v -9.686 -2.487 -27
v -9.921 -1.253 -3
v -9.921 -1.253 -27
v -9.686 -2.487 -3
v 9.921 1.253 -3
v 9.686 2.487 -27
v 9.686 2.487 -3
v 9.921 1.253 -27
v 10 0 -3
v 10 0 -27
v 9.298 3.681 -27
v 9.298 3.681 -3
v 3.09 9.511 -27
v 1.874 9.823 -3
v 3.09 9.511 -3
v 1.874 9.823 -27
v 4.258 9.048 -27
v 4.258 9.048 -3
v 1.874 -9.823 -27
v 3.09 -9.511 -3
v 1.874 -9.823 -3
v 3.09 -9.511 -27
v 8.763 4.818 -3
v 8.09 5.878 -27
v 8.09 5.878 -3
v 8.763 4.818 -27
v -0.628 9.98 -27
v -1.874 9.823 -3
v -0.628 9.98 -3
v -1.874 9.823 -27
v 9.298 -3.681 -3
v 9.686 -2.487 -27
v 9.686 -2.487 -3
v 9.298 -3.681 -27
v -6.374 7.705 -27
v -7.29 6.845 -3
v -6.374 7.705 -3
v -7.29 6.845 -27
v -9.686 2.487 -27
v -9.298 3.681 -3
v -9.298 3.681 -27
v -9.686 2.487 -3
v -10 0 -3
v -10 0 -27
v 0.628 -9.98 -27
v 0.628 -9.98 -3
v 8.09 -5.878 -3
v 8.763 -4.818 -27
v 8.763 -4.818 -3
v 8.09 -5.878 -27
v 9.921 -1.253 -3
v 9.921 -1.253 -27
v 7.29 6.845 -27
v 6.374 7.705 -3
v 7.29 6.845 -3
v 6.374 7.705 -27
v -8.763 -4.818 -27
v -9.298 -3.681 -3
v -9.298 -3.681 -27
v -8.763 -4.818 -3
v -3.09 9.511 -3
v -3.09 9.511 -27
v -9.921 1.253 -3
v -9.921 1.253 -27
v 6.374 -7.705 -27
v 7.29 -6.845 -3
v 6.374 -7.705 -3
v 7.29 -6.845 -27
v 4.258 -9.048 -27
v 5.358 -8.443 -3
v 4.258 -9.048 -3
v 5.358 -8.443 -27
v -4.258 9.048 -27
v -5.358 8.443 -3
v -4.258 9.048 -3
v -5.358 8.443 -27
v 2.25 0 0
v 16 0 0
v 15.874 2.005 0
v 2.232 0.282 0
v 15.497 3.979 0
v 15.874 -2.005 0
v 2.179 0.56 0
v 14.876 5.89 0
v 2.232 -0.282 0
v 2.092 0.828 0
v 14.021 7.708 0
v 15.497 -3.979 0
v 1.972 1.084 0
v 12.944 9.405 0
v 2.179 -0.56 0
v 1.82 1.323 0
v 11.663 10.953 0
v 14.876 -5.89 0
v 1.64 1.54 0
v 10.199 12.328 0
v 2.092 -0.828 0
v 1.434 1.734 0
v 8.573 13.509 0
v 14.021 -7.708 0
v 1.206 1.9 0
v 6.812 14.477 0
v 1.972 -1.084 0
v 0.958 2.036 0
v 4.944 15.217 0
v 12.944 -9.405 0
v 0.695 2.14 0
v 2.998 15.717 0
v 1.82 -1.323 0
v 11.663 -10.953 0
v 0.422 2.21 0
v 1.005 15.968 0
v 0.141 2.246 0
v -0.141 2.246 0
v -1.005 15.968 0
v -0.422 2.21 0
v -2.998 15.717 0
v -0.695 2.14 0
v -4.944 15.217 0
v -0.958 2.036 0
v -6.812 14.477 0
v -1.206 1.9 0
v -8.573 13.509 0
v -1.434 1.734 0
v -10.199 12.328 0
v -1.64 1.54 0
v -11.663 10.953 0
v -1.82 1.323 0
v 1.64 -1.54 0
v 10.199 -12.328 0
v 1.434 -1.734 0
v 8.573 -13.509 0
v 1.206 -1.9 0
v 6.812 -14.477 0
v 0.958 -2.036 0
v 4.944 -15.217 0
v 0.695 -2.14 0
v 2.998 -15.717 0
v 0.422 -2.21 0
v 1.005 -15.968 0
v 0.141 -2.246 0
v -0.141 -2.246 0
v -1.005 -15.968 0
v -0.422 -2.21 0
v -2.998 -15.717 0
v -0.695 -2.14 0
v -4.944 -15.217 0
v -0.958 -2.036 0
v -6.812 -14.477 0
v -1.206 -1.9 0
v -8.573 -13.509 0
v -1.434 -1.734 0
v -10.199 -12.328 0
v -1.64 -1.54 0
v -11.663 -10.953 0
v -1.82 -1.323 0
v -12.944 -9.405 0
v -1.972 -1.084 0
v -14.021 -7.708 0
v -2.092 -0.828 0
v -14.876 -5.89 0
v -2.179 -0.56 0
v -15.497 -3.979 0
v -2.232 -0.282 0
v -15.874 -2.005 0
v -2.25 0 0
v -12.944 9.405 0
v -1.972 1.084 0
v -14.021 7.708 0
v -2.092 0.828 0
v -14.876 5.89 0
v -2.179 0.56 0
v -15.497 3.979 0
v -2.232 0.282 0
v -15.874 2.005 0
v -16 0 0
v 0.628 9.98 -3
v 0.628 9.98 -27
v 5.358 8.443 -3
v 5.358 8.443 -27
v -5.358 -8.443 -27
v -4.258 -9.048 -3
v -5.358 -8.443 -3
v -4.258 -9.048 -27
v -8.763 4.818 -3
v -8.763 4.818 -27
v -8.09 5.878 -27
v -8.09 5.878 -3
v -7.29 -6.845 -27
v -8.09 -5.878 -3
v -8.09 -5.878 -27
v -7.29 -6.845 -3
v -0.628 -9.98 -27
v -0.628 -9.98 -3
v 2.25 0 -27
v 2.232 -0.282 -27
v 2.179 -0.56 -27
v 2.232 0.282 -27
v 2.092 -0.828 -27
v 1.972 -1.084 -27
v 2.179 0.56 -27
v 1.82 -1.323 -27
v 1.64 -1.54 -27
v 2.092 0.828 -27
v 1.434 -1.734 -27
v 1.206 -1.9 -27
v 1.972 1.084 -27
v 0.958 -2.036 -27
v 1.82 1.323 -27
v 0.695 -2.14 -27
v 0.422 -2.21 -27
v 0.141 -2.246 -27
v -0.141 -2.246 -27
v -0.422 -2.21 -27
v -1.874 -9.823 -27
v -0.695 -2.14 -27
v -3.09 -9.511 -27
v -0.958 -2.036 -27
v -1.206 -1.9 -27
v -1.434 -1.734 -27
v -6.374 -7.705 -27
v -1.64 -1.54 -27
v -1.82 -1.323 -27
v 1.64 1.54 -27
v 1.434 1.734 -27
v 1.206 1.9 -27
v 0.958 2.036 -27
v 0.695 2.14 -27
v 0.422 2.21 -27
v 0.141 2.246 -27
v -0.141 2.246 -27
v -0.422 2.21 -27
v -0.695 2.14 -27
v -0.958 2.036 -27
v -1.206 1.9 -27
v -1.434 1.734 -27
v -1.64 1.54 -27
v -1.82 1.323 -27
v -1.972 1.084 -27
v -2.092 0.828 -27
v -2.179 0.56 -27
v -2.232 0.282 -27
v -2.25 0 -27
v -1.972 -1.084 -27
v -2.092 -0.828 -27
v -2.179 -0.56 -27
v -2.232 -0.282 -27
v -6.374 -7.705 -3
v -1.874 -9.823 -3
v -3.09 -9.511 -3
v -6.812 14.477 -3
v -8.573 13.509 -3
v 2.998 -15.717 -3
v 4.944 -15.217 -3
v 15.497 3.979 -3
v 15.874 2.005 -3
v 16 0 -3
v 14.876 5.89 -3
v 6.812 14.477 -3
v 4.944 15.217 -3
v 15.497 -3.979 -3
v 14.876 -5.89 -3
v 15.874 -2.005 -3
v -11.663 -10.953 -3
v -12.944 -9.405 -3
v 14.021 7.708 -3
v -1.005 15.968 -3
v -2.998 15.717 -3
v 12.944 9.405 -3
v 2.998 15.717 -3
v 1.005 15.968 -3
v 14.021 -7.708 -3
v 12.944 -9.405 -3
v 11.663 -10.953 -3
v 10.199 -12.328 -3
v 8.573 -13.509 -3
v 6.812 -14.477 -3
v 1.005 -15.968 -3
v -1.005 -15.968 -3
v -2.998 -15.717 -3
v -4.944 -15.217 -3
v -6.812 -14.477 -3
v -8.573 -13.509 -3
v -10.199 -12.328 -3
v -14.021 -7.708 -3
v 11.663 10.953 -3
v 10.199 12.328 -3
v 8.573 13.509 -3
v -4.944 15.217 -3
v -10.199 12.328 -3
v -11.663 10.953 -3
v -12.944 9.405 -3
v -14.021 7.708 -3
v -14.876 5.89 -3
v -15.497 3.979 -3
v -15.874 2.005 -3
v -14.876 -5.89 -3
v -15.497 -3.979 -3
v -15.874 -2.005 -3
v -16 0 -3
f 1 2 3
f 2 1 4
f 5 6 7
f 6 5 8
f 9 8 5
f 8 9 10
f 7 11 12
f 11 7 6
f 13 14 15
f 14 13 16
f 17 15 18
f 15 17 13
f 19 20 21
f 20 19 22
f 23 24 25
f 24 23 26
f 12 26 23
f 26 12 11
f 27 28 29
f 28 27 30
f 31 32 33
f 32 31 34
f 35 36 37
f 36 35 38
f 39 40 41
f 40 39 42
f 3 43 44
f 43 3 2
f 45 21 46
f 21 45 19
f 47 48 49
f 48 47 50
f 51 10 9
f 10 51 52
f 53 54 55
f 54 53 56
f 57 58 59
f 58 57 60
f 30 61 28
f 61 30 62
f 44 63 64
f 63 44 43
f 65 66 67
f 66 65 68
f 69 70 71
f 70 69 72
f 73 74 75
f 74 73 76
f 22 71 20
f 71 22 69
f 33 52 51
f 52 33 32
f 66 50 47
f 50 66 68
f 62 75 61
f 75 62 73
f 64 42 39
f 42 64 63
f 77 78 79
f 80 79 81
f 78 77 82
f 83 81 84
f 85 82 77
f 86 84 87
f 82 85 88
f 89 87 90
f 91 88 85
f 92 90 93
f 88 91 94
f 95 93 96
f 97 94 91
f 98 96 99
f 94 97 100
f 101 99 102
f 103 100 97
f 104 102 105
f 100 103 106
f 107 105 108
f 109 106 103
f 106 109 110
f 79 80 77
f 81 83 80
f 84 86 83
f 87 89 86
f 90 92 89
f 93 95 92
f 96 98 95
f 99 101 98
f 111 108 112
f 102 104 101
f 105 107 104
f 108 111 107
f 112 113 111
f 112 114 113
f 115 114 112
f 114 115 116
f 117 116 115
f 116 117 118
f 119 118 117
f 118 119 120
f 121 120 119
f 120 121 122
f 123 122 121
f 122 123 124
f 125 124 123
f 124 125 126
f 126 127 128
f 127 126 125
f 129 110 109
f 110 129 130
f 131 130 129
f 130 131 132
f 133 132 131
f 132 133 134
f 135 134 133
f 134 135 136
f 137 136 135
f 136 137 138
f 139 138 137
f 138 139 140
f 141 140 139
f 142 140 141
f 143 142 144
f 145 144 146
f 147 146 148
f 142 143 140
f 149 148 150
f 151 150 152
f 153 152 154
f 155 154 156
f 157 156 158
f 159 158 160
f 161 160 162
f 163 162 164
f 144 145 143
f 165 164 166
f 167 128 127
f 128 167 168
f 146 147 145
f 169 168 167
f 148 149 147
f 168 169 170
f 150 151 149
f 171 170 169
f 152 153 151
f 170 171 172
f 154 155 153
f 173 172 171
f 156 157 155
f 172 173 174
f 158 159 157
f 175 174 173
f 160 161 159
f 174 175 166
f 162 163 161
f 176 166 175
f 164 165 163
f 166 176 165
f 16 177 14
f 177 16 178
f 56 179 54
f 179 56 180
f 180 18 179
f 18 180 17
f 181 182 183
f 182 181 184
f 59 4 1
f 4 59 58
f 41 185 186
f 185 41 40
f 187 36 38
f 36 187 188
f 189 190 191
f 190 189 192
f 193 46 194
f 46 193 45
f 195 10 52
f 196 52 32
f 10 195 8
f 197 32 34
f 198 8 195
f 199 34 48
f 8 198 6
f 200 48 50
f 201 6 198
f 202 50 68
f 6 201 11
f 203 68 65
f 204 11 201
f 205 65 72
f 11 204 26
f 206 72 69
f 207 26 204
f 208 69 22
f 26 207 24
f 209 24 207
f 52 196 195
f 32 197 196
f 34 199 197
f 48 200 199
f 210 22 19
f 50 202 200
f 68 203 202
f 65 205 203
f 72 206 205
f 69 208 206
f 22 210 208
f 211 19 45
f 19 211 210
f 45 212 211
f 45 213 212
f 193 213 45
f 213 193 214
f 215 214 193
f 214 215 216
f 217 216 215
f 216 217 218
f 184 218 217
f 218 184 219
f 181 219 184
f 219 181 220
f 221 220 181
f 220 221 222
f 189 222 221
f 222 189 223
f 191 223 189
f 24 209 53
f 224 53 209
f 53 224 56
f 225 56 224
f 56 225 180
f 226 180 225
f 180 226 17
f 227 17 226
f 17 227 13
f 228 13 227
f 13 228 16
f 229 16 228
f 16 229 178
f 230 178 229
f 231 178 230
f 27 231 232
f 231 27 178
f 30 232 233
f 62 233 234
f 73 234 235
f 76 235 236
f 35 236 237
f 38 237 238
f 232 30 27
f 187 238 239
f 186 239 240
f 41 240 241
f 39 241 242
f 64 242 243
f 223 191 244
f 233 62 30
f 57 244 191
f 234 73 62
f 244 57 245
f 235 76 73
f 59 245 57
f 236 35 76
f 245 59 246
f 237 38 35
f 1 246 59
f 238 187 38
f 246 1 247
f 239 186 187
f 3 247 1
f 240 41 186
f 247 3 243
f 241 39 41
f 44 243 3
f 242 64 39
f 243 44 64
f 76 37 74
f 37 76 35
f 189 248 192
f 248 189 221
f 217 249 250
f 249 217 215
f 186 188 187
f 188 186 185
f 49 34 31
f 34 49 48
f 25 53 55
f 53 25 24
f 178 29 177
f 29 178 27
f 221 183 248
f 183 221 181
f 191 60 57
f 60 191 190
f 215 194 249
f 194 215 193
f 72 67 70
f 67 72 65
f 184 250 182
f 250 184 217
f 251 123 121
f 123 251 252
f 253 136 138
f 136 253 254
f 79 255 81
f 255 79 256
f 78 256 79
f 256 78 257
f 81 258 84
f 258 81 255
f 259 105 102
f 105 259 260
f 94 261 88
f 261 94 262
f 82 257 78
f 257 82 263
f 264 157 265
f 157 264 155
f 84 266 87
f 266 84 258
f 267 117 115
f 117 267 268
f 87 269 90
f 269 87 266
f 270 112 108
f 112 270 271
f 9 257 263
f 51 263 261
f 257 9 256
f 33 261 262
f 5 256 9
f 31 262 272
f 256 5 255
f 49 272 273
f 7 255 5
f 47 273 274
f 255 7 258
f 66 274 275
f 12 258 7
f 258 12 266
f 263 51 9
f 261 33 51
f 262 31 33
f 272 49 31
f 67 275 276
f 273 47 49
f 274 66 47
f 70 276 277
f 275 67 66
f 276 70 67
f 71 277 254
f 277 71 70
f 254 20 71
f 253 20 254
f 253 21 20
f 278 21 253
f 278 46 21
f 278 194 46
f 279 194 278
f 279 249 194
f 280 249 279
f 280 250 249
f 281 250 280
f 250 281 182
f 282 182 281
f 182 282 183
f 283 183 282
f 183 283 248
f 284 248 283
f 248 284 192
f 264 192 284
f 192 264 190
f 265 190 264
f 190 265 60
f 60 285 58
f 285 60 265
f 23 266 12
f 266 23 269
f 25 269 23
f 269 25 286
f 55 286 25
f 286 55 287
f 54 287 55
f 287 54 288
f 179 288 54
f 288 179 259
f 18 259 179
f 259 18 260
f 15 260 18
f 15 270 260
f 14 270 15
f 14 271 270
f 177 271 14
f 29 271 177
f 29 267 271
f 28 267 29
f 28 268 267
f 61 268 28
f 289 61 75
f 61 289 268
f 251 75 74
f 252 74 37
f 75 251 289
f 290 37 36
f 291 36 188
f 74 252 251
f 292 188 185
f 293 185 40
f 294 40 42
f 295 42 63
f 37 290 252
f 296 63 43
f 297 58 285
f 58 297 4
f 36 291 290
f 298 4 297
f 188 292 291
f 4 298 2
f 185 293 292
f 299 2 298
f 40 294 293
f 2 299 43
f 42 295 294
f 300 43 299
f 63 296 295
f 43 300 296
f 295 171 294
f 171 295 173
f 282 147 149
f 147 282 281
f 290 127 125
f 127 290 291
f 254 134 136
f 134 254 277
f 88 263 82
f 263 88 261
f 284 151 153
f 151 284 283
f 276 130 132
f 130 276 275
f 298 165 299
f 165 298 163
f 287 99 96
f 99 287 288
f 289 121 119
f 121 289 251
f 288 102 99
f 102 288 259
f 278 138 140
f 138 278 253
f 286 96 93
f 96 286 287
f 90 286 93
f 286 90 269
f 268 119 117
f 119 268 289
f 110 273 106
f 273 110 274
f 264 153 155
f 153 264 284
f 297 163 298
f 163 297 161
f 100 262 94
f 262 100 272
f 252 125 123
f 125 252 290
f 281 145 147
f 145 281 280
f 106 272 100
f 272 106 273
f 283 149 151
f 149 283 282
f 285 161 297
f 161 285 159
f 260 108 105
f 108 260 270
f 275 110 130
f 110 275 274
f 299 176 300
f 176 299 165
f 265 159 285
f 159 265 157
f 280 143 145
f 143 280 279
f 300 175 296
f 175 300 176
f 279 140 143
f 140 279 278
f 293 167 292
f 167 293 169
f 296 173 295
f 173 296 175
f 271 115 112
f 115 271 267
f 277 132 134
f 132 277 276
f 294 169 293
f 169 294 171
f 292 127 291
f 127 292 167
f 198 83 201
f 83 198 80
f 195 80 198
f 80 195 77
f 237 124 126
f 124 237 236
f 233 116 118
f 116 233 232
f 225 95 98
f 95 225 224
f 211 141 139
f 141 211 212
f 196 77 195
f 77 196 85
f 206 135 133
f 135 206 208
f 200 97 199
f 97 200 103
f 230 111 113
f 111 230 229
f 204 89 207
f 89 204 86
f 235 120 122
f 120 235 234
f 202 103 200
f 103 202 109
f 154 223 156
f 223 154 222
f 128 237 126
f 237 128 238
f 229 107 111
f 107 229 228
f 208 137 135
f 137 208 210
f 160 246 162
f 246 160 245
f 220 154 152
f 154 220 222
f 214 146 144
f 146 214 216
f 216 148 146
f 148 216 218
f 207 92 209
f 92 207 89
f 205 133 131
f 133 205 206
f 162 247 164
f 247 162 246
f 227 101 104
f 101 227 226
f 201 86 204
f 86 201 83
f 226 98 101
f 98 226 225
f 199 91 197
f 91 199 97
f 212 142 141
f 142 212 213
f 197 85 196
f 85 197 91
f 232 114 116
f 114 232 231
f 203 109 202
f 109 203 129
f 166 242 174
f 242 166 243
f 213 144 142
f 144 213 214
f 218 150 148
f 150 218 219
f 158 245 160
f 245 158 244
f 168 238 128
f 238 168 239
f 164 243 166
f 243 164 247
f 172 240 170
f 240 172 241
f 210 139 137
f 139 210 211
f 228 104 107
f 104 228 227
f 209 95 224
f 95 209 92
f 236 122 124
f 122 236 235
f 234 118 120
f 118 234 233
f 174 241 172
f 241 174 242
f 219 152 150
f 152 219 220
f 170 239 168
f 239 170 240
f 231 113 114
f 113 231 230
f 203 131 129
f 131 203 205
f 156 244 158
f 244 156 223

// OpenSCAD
$fn = 50;


difference() {
	union() {
		translate(v = [0, 0, -27.0000000000]) {
			cylinder(h = 27, r = 10.0000000000);
		}
		translate(v = [0, 0, -3.0000000000]) {
			cylinder(h = 3, r = 16.0000000000);
		}
	}
	union() {
		#translate(v = [0, 0, -27]) {
			cylinder(h = 27, r = 2.2500000000);
		}
	}
}
